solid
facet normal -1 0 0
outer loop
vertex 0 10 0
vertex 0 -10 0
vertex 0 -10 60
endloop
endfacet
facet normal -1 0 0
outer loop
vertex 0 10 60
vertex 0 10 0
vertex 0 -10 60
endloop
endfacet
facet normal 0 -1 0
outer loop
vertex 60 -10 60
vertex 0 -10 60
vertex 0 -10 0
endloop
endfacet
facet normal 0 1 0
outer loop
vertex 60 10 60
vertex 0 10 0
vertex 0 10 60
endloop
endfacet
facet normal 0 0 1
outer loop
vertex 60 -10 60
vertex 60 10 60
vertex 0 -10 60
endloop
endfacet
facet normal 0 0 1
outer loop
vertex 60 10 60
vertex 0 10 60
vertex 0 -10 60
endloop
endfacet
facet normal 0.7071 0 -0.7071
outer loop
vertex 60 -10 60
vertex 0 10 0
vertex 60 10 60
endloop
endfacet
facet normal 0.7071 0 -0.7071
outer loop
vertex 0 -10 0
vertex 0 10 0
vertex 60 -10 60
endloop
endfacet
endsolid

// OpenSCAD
X=1;
Y=1;
Z=1;
echo(version());
cube_size = 20; // [10:Small,20:Medium,30:Large]

hole_diameter = 2.5;
hole_radius = hole_diameter/2;

// How deep should the center hole be?
hole_depth = 1; // [0,1,5,50]

show_wheels = "yes"; // [yes,no]

// How thick should the side wheels be?
wheel_thickness = 1; // [1:20]

// ignore this variable!
// foo=1;

// don't turn functions into params!
function BEZ03(u) = pow((1-u), 3);

// ignore variable values
bing = 3+4;
baz = 3 / hole_depth;

module triangle(scale) {polyhedron(points = [[0, -10, 60], [0, 10, 60], [0, 10, 0], [0, -10, 0], [60, -10, 60], [60, 10, 60]], 
triangles = [[0,3,2], [0,2,1], [3,0,4], [1,2,5], [0,5,4], [0,1,5],  [5,2,4], [4,2,3], ]);}

//resize(newsize=[X,Y,Z]) triangle(1);
scale([X,Y,Z]) triangle(1);
